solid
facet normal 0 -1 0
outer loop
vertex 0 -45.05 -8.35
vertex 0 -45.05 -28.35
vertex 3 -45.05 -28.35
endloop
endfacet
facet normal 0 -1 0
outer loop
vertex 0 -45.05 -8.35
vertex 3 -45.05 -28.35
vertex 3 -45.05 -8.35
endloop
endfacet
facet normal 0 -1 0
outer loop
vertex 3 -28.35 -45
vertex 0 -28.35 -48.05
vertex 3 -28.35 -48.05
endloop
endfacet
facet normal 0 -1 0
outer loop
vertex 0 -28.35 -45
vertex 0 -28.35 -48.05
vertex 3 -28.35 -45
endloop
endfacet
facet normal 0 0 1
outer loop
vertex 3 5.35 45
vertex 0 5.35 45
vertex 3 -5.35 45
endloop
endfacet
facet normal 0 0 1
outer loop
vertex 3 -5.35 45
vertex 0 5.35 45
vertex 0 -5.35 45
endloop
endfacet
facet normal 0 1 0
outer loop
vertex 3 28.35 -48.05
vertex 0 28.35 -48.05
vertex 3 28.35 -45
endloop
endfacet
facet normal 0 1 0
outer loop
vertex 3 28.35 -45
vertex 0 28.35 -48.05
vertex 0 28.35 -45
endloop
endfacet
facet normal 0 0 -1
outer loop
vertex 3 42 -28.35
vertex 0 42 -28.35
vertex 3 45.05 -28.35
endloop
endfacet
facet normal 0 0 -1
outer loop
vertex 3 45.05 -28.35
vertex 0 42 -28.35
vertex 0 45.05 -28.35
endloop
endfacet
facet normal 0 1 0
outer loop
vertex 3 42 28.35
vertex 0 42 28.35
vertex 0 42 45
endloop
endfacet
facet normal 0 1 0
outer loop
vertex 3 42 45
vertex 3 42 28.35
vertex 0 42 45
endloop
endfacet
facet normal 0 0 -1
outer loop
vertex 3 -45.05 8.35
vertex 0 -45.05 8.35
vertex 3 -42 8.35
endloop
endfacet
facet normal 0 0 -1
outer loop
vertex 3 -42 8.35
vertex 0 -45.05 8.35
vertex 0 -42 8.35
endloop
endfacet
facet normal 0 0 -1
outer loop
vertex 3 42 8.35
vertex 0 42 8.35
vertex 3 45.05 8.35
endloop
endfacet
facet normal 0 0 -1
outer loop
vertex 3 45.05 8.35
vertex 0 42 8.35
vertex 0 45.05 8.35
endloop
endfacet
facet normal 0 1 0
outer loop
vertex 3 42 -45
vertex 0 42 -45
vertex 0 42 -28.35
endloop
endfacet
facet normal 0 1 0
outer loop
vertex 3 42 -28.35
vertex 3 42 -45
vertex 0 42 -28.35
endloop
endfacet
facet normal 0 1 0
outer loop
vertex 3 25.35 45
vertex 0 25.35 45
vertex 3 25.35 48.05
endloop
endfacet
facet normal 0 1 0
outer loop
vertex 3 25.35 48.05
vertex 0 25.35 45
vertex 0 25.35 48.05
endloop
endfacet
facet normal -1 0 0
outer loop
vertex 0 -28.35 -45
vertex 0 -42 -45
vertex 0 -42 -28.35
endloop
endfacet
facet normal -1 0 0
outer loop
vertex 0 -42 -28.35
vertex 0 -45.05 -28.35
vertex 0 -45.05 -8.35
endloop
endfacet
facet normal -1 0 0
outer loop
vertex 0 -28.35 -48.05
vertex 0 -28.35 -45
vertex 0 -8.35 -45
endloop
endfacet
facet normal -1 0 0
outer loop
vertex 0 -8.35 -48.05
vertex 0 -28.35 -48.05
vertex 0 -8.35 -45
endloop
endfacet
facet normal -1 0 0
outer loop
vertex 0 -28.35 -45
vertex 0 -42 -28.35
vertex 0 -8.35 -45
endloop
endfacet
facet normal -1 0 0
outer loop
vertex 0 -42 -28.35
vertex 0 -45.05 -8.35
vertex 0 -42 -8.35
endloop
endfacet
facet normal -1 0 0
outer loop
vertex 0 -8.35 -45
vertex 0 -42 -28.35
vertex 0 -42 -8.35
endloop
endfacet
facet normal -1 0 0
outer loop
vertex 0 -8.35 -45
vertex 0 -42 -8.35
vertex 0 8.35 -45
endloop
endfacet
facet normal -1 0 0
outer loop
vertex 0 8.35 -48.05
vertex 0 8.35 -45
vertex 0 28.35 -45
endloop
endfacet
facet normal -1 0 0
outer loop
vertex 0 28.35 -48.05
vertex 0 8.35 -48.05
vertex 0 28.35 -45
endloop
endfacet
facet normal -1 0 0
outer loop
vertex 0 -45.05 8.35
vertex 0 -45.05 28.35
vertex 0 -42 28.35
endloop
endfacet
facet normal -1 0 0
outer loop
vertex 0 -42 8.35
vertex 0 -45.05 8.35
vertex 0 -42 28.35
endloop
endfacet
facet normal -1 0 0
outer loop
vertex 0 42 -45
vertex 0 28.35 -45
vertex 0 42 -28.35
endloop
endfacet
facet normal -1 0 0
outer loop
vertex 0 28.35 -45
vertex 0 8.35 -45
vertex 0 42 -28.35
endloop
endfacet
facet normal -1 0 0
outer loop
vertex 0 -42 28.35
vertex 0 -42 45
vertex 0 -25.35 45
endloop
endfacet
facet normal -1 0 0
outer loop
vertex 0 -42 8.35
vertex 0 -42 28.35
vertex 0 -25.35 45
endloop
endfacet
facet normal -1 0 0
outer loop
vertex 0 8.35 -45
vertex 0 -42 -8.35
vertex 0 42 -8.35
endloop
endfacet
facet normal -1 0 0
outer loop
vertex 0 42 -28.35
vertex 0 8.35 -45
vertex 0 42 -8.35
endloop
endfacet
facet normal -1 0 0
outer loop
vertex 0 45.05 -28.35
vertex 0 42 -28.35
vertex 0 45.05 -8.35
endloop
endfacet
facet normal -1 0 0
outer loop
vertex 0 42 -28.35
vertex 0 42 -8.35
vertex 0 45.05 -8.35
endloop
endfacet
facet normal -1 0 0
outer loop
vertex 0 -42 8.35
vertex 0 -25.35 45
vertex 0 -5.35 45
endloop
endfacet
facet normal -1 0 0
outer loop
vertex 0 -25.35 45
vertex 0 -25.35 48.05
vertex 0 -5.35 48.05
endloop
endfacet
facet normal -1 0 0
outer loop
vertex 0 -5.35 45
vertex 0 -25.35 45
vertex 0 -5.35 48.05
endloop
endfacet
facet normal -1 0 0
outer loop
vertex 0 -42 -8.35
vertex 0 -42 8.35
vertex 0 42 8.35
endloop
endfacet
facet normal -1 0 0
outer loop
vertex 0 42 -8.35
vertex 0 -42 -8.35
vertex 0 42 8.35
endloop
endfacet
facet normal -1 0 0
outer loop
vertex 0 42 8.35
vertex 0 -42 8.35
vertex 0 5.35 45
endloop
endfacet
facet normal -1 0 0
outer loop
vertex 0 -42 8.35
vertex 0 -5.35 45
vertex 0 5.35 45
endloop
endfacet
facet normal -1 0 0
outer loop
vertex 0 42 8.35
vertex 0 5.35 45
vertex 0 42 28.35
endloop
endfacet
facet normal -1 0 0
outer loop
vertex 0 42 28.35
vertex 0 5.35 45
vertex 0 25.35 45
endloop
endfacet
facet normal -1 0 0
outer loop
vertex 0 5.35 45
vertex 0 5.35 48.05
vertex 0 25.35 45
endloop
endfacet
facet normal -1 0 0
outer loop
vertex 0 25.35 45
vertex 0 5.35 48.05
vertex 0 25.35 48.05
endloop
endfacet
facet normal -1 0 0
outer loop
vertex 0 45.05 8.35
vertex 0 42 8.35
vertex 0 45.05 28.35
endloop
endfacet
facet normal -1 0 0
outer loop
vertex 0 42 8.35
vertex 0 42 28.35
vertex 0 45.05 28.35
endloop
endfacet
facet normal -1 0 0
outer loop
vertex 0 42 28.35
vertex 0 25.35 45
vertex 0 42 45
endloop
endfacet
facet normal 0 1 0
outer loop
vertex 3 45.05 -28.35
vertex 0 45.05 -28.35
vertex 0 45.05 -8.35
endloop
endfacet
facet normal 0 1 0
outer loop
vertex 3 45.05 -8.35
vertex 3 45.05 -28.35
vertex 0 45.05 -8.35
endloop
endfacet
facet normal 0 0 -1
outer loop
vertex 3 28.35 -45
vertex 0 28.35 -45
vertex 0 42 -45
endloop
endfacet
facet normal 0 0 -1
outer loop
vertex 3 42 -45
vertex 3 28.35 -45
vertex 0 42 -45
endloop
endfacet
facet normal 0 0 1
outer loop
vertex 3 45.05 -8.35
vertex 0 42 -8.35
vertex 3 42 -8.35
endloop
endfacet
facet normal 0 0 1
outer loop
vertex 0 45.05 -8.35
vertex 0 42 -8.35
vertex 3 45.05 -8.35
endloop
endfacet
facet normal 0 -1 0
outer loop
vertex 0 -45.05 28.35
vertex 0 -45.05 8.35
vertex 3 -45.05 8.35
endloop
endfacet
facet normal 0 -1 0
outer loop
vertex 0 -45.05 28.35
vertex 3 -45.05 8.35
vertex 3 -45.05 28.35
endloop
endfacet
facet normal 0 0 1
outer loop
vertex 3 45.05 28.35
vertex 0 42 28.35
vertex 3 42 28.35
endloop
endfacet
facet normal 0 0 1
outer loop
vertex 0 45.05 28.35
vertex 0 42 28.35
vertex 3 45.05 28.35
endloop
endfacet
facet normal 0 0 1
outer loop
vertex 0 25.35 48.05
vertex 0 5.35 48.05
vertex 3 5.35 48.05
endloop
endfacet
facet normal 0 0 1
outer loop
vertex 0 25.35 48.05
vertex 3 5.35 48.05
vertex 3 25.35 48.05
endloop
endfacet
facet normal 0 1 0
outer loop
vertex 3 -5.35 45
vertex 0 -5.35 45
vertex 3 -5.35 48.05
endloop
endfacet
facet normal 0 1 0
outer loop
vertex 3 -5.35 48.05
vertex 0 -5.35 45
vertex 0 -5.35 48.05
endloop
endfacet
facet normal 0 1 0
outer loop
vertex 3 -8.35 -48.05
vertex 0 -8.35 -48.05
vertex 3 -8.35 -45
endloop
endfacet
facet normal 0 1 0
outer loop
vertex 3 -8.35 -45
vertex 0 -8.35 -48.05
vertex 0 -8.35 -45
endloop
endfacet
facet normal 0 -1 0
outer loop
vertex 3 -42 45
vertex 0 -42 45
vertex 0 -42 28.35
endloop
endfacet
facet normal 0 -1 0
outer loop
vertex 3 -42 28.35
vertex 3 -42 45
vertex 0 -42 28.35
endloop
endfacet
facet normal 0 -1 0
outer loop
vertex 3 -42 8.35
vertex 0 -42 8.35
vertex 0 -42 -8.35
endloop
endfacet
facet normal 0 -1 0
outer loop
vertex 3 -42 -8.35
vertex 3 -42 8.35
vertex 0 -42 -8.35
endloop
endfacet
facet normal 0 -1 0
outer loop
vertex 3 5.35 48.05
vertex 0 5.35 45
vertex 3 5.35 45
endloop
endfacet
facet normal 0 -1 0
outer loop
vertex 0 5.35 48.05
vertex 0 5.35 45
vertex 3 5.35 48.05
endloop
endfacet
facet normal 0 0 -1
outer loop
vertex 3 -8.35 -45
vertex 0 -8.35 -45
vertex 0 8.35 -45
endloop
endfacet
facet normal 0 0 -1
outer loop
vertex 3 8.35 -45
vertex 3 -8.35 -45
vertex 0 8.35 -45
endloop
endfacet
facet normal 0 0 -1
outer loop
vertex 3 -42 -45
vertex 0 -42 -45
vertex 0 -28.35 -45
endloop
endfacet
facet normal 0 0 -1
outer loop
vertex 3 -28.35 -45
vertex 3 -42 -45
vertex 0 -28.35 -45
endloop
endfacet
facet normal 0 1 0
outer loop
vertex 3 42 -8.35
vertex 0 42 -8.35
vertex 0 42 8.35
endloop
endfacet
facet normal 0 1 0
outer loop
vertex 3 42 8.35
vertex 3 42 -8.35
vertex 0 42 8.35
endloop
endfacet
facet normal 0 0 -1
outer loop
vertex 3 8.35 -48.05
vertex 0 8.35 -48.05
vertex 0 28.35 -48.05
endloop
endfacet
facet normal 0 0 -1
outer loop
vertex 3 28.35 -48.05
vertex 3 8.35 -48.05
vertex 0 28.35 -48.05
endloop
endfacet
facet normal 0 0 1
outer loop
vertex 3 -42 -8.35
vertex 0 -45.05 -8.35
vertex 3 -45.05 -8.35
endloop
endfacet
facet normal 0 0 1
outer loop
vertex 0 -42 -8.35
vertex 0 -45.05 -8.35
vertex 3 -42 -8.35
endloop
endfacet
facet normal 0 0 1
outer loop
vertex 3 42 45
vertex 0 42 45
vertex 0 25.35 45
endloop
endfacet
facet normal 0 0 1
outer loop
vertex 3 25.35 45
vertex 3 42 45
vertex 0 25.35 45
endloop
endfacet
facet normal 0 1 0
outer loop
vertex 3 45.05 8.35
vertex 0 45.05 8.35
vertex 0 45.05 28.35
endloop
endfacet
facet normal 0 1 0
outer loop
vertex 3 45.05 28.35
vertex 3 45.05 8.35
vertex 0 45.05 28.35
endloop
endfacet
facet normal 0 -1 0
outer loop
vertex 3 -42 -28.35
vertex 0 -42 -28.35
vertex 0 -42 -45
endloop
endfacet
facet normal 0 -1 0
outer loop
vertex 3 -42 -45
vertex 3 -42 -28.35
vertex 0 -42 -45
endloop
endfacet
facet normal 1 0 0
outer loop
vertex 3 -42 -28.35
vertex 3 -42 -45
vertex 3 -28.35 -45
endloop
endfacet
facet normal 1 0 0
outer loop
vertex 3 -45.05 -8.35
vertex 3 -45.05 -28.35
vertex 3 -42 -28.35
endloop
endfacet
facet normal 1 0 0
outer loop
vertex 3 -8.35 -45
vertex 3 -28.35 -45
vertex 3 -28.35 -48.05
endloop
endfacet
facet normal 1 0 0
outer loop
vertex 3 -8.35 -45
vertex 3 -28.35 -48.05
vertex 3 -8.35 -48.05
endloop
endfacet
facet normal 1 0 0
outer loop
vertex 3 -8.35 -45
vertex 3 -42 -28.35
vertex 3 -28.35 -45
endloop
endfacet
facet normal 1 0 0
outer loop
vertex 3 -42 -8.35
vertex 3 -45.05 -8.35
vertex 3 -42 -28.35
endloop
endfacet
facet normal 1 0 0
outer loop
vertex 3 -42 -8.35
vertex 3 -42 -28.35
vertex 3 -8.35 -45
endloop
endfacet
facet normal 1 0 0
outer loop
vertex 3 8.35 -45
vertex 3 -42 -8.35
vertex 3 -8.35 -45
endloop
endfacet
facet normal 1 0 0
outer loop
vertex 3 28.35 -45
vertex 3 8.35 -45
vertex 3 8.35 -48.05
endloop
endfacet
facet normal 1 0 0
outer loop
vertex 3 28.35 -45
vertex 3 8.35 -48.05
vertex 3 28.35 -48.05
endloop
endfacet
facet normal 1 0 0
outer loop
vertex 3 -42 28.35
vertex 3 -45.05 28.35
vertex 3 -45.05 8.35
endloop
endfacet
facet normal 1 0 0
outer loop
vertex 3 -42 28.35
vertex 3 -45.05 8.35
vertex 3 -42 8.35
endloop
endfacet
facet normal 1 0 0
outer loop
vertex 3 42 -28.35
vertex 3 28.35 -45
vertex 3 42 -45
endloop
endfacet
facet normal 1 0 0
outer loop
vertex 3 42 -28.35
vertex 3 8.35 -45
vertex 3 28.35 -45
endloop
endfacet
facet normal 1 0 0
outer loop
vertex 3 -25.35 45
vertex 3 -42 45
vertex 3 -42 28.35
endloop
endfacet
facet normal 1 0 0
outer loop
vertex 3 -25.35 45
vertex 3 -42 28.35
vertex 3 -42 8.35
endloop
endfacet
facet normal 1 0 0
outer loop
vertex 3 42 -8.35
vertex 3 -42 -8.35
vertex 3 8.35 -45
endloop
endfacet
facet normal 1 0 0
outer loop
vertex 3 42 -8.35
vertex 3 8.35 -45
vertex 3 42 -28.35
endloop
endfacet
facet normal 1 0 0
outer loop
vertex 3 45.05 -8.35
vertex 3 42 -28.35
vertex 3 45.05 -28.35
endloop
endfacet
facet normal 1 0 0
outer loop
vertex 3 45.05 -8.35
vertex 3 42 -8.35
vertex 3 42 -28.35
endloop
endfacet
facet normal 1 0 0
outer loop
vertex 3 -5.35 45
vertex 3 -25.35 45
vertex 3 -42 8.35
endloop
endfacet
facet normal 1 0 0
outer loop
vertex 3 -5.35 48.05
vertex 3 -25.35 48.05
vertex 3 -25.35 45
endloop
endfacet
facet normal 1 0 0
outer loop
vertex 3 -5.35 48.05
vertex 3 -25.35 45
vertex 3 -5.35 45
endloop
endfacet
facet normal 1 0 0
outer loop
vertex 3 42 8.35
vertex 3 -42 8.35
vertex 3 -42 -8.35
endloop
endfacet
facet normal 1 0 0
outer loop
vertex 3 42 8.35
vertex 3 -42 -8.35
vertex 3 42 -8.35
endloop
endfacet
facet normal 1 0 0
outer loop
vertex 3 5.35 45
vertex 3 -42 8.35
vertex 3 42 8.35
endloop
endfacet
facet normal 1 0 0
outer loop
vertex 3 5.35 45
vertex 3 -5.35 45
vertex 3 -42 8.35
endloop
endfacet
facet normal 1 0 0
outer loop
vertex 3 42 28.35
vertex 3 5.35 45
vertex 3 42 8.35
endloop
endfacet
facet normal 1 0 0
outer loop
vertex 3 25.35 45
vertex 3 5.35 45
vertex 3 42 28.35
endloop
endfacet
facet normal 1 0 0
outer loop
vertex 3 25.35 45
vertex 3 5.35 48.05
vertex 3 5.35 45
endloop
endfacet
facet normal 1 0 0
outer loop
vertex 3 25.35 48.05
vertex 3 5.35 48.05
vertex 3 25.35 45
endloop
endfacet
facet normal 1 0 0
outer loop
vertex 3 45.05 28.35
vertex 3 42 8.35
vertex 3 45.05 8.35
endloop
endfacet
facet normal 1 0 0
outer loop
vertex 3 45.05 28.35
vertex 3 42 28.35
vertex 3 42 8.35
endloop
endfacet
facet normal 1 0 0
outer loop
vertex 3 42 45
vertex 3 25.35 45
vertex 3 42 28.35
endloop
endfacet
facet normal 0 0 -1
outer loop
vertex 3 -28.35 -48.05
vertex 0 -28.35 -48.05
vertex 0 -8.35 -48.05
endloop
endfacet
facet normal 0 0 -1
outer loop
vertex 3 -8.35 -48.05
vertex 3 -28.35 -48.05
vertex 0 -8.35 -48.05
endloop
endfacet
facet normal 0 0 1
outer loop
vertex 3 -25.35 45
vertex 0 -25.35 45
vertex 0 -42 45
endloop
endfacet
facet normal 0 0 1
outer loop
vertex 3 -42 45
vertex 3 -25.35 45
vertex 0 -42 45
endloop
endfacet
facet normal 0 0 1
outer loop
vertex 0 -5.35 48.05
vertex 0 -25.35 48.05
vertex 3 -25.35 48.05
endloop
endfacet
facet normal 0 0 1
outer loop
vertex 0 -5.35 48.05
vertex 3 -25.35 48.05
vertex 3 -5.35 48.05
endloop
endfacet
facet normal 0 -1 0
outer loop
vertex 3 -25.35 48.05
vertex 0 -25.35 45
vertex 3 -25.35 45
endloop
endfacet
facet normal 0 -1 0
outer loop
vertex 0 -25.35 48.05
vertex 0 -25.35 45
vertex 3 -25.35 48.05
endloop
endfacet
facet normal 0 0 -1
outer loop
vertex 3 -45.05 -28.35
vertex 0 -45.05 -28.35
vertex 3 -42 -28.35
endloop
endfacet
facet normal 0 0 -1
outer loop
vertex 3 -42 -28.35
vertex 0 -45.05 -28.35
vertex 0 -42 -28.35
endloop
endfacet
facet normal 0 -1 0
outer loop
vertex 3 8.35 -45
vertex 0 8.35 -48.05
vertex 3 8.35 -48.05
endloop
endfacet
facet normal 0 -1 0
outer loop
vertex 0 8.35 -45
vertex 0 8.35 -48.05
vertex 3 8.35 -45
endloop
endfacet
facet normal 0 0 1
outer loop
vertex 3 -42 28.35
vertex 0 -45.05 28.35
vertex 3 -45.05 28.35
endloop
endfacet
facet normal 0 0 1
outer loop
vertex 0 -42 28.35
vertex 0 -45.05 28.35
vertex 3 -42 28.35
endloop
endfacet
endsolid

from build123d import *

# Parameters (mm, degrees)
F0_W     = 3.05
F0_H     = 20
F0_W_2   = 20
F0_H_2   = 3.05
F1_DEPTH = 3


with BuildPart() as f1:
    # F0 (on Right) → F1 (new body)
    with BuildSketch(Plane.YZ):
        Polygon((28.35, -45), (42, -45), (42, -28.35), (42, -8.35), (42, 8.35), (42, 28.35), (42, 45), (25.35, 45), (5.35, 45), (-5.35, 45), (-25.35, 45), (-42, 45), (-42, 28.35), (-42, 8.35), (-42, -8.35), (-42, -28.35), (-42, -45), (-28.35, -45), (-8.35, -45), (8.35, -45), align=None)
        with Locations((-43.525, 18.35)):
            Rectangle(F0_W, F0_H)
        with Locations((-43.525, -18.35)):
            Rectangle(F0_W, F0_H)
        with Locations((-18.35, -46.525)):
            Rectangle(F0_W_2, F0_H_2)
        with Locations((18.35, -46.525)):
            Rectangle(F0_W_2, F0_H_2)
        with Locations((43.525, -18.35)):
            Rectangle(F0_W, F0_H)
        with Locations((43.525, 18.35)):
            Rectangle(F0_W, F0_H)
        with Locations((15.35, 46.525)):
            Rectangle(F0_W_2, F0_H_2)
        with Locations((-15.35, 46.525)):
            Rectangle(F0_W_2, F0_H_2)
    extrude(amount=F1_DEPTH)


solid = f1.part
